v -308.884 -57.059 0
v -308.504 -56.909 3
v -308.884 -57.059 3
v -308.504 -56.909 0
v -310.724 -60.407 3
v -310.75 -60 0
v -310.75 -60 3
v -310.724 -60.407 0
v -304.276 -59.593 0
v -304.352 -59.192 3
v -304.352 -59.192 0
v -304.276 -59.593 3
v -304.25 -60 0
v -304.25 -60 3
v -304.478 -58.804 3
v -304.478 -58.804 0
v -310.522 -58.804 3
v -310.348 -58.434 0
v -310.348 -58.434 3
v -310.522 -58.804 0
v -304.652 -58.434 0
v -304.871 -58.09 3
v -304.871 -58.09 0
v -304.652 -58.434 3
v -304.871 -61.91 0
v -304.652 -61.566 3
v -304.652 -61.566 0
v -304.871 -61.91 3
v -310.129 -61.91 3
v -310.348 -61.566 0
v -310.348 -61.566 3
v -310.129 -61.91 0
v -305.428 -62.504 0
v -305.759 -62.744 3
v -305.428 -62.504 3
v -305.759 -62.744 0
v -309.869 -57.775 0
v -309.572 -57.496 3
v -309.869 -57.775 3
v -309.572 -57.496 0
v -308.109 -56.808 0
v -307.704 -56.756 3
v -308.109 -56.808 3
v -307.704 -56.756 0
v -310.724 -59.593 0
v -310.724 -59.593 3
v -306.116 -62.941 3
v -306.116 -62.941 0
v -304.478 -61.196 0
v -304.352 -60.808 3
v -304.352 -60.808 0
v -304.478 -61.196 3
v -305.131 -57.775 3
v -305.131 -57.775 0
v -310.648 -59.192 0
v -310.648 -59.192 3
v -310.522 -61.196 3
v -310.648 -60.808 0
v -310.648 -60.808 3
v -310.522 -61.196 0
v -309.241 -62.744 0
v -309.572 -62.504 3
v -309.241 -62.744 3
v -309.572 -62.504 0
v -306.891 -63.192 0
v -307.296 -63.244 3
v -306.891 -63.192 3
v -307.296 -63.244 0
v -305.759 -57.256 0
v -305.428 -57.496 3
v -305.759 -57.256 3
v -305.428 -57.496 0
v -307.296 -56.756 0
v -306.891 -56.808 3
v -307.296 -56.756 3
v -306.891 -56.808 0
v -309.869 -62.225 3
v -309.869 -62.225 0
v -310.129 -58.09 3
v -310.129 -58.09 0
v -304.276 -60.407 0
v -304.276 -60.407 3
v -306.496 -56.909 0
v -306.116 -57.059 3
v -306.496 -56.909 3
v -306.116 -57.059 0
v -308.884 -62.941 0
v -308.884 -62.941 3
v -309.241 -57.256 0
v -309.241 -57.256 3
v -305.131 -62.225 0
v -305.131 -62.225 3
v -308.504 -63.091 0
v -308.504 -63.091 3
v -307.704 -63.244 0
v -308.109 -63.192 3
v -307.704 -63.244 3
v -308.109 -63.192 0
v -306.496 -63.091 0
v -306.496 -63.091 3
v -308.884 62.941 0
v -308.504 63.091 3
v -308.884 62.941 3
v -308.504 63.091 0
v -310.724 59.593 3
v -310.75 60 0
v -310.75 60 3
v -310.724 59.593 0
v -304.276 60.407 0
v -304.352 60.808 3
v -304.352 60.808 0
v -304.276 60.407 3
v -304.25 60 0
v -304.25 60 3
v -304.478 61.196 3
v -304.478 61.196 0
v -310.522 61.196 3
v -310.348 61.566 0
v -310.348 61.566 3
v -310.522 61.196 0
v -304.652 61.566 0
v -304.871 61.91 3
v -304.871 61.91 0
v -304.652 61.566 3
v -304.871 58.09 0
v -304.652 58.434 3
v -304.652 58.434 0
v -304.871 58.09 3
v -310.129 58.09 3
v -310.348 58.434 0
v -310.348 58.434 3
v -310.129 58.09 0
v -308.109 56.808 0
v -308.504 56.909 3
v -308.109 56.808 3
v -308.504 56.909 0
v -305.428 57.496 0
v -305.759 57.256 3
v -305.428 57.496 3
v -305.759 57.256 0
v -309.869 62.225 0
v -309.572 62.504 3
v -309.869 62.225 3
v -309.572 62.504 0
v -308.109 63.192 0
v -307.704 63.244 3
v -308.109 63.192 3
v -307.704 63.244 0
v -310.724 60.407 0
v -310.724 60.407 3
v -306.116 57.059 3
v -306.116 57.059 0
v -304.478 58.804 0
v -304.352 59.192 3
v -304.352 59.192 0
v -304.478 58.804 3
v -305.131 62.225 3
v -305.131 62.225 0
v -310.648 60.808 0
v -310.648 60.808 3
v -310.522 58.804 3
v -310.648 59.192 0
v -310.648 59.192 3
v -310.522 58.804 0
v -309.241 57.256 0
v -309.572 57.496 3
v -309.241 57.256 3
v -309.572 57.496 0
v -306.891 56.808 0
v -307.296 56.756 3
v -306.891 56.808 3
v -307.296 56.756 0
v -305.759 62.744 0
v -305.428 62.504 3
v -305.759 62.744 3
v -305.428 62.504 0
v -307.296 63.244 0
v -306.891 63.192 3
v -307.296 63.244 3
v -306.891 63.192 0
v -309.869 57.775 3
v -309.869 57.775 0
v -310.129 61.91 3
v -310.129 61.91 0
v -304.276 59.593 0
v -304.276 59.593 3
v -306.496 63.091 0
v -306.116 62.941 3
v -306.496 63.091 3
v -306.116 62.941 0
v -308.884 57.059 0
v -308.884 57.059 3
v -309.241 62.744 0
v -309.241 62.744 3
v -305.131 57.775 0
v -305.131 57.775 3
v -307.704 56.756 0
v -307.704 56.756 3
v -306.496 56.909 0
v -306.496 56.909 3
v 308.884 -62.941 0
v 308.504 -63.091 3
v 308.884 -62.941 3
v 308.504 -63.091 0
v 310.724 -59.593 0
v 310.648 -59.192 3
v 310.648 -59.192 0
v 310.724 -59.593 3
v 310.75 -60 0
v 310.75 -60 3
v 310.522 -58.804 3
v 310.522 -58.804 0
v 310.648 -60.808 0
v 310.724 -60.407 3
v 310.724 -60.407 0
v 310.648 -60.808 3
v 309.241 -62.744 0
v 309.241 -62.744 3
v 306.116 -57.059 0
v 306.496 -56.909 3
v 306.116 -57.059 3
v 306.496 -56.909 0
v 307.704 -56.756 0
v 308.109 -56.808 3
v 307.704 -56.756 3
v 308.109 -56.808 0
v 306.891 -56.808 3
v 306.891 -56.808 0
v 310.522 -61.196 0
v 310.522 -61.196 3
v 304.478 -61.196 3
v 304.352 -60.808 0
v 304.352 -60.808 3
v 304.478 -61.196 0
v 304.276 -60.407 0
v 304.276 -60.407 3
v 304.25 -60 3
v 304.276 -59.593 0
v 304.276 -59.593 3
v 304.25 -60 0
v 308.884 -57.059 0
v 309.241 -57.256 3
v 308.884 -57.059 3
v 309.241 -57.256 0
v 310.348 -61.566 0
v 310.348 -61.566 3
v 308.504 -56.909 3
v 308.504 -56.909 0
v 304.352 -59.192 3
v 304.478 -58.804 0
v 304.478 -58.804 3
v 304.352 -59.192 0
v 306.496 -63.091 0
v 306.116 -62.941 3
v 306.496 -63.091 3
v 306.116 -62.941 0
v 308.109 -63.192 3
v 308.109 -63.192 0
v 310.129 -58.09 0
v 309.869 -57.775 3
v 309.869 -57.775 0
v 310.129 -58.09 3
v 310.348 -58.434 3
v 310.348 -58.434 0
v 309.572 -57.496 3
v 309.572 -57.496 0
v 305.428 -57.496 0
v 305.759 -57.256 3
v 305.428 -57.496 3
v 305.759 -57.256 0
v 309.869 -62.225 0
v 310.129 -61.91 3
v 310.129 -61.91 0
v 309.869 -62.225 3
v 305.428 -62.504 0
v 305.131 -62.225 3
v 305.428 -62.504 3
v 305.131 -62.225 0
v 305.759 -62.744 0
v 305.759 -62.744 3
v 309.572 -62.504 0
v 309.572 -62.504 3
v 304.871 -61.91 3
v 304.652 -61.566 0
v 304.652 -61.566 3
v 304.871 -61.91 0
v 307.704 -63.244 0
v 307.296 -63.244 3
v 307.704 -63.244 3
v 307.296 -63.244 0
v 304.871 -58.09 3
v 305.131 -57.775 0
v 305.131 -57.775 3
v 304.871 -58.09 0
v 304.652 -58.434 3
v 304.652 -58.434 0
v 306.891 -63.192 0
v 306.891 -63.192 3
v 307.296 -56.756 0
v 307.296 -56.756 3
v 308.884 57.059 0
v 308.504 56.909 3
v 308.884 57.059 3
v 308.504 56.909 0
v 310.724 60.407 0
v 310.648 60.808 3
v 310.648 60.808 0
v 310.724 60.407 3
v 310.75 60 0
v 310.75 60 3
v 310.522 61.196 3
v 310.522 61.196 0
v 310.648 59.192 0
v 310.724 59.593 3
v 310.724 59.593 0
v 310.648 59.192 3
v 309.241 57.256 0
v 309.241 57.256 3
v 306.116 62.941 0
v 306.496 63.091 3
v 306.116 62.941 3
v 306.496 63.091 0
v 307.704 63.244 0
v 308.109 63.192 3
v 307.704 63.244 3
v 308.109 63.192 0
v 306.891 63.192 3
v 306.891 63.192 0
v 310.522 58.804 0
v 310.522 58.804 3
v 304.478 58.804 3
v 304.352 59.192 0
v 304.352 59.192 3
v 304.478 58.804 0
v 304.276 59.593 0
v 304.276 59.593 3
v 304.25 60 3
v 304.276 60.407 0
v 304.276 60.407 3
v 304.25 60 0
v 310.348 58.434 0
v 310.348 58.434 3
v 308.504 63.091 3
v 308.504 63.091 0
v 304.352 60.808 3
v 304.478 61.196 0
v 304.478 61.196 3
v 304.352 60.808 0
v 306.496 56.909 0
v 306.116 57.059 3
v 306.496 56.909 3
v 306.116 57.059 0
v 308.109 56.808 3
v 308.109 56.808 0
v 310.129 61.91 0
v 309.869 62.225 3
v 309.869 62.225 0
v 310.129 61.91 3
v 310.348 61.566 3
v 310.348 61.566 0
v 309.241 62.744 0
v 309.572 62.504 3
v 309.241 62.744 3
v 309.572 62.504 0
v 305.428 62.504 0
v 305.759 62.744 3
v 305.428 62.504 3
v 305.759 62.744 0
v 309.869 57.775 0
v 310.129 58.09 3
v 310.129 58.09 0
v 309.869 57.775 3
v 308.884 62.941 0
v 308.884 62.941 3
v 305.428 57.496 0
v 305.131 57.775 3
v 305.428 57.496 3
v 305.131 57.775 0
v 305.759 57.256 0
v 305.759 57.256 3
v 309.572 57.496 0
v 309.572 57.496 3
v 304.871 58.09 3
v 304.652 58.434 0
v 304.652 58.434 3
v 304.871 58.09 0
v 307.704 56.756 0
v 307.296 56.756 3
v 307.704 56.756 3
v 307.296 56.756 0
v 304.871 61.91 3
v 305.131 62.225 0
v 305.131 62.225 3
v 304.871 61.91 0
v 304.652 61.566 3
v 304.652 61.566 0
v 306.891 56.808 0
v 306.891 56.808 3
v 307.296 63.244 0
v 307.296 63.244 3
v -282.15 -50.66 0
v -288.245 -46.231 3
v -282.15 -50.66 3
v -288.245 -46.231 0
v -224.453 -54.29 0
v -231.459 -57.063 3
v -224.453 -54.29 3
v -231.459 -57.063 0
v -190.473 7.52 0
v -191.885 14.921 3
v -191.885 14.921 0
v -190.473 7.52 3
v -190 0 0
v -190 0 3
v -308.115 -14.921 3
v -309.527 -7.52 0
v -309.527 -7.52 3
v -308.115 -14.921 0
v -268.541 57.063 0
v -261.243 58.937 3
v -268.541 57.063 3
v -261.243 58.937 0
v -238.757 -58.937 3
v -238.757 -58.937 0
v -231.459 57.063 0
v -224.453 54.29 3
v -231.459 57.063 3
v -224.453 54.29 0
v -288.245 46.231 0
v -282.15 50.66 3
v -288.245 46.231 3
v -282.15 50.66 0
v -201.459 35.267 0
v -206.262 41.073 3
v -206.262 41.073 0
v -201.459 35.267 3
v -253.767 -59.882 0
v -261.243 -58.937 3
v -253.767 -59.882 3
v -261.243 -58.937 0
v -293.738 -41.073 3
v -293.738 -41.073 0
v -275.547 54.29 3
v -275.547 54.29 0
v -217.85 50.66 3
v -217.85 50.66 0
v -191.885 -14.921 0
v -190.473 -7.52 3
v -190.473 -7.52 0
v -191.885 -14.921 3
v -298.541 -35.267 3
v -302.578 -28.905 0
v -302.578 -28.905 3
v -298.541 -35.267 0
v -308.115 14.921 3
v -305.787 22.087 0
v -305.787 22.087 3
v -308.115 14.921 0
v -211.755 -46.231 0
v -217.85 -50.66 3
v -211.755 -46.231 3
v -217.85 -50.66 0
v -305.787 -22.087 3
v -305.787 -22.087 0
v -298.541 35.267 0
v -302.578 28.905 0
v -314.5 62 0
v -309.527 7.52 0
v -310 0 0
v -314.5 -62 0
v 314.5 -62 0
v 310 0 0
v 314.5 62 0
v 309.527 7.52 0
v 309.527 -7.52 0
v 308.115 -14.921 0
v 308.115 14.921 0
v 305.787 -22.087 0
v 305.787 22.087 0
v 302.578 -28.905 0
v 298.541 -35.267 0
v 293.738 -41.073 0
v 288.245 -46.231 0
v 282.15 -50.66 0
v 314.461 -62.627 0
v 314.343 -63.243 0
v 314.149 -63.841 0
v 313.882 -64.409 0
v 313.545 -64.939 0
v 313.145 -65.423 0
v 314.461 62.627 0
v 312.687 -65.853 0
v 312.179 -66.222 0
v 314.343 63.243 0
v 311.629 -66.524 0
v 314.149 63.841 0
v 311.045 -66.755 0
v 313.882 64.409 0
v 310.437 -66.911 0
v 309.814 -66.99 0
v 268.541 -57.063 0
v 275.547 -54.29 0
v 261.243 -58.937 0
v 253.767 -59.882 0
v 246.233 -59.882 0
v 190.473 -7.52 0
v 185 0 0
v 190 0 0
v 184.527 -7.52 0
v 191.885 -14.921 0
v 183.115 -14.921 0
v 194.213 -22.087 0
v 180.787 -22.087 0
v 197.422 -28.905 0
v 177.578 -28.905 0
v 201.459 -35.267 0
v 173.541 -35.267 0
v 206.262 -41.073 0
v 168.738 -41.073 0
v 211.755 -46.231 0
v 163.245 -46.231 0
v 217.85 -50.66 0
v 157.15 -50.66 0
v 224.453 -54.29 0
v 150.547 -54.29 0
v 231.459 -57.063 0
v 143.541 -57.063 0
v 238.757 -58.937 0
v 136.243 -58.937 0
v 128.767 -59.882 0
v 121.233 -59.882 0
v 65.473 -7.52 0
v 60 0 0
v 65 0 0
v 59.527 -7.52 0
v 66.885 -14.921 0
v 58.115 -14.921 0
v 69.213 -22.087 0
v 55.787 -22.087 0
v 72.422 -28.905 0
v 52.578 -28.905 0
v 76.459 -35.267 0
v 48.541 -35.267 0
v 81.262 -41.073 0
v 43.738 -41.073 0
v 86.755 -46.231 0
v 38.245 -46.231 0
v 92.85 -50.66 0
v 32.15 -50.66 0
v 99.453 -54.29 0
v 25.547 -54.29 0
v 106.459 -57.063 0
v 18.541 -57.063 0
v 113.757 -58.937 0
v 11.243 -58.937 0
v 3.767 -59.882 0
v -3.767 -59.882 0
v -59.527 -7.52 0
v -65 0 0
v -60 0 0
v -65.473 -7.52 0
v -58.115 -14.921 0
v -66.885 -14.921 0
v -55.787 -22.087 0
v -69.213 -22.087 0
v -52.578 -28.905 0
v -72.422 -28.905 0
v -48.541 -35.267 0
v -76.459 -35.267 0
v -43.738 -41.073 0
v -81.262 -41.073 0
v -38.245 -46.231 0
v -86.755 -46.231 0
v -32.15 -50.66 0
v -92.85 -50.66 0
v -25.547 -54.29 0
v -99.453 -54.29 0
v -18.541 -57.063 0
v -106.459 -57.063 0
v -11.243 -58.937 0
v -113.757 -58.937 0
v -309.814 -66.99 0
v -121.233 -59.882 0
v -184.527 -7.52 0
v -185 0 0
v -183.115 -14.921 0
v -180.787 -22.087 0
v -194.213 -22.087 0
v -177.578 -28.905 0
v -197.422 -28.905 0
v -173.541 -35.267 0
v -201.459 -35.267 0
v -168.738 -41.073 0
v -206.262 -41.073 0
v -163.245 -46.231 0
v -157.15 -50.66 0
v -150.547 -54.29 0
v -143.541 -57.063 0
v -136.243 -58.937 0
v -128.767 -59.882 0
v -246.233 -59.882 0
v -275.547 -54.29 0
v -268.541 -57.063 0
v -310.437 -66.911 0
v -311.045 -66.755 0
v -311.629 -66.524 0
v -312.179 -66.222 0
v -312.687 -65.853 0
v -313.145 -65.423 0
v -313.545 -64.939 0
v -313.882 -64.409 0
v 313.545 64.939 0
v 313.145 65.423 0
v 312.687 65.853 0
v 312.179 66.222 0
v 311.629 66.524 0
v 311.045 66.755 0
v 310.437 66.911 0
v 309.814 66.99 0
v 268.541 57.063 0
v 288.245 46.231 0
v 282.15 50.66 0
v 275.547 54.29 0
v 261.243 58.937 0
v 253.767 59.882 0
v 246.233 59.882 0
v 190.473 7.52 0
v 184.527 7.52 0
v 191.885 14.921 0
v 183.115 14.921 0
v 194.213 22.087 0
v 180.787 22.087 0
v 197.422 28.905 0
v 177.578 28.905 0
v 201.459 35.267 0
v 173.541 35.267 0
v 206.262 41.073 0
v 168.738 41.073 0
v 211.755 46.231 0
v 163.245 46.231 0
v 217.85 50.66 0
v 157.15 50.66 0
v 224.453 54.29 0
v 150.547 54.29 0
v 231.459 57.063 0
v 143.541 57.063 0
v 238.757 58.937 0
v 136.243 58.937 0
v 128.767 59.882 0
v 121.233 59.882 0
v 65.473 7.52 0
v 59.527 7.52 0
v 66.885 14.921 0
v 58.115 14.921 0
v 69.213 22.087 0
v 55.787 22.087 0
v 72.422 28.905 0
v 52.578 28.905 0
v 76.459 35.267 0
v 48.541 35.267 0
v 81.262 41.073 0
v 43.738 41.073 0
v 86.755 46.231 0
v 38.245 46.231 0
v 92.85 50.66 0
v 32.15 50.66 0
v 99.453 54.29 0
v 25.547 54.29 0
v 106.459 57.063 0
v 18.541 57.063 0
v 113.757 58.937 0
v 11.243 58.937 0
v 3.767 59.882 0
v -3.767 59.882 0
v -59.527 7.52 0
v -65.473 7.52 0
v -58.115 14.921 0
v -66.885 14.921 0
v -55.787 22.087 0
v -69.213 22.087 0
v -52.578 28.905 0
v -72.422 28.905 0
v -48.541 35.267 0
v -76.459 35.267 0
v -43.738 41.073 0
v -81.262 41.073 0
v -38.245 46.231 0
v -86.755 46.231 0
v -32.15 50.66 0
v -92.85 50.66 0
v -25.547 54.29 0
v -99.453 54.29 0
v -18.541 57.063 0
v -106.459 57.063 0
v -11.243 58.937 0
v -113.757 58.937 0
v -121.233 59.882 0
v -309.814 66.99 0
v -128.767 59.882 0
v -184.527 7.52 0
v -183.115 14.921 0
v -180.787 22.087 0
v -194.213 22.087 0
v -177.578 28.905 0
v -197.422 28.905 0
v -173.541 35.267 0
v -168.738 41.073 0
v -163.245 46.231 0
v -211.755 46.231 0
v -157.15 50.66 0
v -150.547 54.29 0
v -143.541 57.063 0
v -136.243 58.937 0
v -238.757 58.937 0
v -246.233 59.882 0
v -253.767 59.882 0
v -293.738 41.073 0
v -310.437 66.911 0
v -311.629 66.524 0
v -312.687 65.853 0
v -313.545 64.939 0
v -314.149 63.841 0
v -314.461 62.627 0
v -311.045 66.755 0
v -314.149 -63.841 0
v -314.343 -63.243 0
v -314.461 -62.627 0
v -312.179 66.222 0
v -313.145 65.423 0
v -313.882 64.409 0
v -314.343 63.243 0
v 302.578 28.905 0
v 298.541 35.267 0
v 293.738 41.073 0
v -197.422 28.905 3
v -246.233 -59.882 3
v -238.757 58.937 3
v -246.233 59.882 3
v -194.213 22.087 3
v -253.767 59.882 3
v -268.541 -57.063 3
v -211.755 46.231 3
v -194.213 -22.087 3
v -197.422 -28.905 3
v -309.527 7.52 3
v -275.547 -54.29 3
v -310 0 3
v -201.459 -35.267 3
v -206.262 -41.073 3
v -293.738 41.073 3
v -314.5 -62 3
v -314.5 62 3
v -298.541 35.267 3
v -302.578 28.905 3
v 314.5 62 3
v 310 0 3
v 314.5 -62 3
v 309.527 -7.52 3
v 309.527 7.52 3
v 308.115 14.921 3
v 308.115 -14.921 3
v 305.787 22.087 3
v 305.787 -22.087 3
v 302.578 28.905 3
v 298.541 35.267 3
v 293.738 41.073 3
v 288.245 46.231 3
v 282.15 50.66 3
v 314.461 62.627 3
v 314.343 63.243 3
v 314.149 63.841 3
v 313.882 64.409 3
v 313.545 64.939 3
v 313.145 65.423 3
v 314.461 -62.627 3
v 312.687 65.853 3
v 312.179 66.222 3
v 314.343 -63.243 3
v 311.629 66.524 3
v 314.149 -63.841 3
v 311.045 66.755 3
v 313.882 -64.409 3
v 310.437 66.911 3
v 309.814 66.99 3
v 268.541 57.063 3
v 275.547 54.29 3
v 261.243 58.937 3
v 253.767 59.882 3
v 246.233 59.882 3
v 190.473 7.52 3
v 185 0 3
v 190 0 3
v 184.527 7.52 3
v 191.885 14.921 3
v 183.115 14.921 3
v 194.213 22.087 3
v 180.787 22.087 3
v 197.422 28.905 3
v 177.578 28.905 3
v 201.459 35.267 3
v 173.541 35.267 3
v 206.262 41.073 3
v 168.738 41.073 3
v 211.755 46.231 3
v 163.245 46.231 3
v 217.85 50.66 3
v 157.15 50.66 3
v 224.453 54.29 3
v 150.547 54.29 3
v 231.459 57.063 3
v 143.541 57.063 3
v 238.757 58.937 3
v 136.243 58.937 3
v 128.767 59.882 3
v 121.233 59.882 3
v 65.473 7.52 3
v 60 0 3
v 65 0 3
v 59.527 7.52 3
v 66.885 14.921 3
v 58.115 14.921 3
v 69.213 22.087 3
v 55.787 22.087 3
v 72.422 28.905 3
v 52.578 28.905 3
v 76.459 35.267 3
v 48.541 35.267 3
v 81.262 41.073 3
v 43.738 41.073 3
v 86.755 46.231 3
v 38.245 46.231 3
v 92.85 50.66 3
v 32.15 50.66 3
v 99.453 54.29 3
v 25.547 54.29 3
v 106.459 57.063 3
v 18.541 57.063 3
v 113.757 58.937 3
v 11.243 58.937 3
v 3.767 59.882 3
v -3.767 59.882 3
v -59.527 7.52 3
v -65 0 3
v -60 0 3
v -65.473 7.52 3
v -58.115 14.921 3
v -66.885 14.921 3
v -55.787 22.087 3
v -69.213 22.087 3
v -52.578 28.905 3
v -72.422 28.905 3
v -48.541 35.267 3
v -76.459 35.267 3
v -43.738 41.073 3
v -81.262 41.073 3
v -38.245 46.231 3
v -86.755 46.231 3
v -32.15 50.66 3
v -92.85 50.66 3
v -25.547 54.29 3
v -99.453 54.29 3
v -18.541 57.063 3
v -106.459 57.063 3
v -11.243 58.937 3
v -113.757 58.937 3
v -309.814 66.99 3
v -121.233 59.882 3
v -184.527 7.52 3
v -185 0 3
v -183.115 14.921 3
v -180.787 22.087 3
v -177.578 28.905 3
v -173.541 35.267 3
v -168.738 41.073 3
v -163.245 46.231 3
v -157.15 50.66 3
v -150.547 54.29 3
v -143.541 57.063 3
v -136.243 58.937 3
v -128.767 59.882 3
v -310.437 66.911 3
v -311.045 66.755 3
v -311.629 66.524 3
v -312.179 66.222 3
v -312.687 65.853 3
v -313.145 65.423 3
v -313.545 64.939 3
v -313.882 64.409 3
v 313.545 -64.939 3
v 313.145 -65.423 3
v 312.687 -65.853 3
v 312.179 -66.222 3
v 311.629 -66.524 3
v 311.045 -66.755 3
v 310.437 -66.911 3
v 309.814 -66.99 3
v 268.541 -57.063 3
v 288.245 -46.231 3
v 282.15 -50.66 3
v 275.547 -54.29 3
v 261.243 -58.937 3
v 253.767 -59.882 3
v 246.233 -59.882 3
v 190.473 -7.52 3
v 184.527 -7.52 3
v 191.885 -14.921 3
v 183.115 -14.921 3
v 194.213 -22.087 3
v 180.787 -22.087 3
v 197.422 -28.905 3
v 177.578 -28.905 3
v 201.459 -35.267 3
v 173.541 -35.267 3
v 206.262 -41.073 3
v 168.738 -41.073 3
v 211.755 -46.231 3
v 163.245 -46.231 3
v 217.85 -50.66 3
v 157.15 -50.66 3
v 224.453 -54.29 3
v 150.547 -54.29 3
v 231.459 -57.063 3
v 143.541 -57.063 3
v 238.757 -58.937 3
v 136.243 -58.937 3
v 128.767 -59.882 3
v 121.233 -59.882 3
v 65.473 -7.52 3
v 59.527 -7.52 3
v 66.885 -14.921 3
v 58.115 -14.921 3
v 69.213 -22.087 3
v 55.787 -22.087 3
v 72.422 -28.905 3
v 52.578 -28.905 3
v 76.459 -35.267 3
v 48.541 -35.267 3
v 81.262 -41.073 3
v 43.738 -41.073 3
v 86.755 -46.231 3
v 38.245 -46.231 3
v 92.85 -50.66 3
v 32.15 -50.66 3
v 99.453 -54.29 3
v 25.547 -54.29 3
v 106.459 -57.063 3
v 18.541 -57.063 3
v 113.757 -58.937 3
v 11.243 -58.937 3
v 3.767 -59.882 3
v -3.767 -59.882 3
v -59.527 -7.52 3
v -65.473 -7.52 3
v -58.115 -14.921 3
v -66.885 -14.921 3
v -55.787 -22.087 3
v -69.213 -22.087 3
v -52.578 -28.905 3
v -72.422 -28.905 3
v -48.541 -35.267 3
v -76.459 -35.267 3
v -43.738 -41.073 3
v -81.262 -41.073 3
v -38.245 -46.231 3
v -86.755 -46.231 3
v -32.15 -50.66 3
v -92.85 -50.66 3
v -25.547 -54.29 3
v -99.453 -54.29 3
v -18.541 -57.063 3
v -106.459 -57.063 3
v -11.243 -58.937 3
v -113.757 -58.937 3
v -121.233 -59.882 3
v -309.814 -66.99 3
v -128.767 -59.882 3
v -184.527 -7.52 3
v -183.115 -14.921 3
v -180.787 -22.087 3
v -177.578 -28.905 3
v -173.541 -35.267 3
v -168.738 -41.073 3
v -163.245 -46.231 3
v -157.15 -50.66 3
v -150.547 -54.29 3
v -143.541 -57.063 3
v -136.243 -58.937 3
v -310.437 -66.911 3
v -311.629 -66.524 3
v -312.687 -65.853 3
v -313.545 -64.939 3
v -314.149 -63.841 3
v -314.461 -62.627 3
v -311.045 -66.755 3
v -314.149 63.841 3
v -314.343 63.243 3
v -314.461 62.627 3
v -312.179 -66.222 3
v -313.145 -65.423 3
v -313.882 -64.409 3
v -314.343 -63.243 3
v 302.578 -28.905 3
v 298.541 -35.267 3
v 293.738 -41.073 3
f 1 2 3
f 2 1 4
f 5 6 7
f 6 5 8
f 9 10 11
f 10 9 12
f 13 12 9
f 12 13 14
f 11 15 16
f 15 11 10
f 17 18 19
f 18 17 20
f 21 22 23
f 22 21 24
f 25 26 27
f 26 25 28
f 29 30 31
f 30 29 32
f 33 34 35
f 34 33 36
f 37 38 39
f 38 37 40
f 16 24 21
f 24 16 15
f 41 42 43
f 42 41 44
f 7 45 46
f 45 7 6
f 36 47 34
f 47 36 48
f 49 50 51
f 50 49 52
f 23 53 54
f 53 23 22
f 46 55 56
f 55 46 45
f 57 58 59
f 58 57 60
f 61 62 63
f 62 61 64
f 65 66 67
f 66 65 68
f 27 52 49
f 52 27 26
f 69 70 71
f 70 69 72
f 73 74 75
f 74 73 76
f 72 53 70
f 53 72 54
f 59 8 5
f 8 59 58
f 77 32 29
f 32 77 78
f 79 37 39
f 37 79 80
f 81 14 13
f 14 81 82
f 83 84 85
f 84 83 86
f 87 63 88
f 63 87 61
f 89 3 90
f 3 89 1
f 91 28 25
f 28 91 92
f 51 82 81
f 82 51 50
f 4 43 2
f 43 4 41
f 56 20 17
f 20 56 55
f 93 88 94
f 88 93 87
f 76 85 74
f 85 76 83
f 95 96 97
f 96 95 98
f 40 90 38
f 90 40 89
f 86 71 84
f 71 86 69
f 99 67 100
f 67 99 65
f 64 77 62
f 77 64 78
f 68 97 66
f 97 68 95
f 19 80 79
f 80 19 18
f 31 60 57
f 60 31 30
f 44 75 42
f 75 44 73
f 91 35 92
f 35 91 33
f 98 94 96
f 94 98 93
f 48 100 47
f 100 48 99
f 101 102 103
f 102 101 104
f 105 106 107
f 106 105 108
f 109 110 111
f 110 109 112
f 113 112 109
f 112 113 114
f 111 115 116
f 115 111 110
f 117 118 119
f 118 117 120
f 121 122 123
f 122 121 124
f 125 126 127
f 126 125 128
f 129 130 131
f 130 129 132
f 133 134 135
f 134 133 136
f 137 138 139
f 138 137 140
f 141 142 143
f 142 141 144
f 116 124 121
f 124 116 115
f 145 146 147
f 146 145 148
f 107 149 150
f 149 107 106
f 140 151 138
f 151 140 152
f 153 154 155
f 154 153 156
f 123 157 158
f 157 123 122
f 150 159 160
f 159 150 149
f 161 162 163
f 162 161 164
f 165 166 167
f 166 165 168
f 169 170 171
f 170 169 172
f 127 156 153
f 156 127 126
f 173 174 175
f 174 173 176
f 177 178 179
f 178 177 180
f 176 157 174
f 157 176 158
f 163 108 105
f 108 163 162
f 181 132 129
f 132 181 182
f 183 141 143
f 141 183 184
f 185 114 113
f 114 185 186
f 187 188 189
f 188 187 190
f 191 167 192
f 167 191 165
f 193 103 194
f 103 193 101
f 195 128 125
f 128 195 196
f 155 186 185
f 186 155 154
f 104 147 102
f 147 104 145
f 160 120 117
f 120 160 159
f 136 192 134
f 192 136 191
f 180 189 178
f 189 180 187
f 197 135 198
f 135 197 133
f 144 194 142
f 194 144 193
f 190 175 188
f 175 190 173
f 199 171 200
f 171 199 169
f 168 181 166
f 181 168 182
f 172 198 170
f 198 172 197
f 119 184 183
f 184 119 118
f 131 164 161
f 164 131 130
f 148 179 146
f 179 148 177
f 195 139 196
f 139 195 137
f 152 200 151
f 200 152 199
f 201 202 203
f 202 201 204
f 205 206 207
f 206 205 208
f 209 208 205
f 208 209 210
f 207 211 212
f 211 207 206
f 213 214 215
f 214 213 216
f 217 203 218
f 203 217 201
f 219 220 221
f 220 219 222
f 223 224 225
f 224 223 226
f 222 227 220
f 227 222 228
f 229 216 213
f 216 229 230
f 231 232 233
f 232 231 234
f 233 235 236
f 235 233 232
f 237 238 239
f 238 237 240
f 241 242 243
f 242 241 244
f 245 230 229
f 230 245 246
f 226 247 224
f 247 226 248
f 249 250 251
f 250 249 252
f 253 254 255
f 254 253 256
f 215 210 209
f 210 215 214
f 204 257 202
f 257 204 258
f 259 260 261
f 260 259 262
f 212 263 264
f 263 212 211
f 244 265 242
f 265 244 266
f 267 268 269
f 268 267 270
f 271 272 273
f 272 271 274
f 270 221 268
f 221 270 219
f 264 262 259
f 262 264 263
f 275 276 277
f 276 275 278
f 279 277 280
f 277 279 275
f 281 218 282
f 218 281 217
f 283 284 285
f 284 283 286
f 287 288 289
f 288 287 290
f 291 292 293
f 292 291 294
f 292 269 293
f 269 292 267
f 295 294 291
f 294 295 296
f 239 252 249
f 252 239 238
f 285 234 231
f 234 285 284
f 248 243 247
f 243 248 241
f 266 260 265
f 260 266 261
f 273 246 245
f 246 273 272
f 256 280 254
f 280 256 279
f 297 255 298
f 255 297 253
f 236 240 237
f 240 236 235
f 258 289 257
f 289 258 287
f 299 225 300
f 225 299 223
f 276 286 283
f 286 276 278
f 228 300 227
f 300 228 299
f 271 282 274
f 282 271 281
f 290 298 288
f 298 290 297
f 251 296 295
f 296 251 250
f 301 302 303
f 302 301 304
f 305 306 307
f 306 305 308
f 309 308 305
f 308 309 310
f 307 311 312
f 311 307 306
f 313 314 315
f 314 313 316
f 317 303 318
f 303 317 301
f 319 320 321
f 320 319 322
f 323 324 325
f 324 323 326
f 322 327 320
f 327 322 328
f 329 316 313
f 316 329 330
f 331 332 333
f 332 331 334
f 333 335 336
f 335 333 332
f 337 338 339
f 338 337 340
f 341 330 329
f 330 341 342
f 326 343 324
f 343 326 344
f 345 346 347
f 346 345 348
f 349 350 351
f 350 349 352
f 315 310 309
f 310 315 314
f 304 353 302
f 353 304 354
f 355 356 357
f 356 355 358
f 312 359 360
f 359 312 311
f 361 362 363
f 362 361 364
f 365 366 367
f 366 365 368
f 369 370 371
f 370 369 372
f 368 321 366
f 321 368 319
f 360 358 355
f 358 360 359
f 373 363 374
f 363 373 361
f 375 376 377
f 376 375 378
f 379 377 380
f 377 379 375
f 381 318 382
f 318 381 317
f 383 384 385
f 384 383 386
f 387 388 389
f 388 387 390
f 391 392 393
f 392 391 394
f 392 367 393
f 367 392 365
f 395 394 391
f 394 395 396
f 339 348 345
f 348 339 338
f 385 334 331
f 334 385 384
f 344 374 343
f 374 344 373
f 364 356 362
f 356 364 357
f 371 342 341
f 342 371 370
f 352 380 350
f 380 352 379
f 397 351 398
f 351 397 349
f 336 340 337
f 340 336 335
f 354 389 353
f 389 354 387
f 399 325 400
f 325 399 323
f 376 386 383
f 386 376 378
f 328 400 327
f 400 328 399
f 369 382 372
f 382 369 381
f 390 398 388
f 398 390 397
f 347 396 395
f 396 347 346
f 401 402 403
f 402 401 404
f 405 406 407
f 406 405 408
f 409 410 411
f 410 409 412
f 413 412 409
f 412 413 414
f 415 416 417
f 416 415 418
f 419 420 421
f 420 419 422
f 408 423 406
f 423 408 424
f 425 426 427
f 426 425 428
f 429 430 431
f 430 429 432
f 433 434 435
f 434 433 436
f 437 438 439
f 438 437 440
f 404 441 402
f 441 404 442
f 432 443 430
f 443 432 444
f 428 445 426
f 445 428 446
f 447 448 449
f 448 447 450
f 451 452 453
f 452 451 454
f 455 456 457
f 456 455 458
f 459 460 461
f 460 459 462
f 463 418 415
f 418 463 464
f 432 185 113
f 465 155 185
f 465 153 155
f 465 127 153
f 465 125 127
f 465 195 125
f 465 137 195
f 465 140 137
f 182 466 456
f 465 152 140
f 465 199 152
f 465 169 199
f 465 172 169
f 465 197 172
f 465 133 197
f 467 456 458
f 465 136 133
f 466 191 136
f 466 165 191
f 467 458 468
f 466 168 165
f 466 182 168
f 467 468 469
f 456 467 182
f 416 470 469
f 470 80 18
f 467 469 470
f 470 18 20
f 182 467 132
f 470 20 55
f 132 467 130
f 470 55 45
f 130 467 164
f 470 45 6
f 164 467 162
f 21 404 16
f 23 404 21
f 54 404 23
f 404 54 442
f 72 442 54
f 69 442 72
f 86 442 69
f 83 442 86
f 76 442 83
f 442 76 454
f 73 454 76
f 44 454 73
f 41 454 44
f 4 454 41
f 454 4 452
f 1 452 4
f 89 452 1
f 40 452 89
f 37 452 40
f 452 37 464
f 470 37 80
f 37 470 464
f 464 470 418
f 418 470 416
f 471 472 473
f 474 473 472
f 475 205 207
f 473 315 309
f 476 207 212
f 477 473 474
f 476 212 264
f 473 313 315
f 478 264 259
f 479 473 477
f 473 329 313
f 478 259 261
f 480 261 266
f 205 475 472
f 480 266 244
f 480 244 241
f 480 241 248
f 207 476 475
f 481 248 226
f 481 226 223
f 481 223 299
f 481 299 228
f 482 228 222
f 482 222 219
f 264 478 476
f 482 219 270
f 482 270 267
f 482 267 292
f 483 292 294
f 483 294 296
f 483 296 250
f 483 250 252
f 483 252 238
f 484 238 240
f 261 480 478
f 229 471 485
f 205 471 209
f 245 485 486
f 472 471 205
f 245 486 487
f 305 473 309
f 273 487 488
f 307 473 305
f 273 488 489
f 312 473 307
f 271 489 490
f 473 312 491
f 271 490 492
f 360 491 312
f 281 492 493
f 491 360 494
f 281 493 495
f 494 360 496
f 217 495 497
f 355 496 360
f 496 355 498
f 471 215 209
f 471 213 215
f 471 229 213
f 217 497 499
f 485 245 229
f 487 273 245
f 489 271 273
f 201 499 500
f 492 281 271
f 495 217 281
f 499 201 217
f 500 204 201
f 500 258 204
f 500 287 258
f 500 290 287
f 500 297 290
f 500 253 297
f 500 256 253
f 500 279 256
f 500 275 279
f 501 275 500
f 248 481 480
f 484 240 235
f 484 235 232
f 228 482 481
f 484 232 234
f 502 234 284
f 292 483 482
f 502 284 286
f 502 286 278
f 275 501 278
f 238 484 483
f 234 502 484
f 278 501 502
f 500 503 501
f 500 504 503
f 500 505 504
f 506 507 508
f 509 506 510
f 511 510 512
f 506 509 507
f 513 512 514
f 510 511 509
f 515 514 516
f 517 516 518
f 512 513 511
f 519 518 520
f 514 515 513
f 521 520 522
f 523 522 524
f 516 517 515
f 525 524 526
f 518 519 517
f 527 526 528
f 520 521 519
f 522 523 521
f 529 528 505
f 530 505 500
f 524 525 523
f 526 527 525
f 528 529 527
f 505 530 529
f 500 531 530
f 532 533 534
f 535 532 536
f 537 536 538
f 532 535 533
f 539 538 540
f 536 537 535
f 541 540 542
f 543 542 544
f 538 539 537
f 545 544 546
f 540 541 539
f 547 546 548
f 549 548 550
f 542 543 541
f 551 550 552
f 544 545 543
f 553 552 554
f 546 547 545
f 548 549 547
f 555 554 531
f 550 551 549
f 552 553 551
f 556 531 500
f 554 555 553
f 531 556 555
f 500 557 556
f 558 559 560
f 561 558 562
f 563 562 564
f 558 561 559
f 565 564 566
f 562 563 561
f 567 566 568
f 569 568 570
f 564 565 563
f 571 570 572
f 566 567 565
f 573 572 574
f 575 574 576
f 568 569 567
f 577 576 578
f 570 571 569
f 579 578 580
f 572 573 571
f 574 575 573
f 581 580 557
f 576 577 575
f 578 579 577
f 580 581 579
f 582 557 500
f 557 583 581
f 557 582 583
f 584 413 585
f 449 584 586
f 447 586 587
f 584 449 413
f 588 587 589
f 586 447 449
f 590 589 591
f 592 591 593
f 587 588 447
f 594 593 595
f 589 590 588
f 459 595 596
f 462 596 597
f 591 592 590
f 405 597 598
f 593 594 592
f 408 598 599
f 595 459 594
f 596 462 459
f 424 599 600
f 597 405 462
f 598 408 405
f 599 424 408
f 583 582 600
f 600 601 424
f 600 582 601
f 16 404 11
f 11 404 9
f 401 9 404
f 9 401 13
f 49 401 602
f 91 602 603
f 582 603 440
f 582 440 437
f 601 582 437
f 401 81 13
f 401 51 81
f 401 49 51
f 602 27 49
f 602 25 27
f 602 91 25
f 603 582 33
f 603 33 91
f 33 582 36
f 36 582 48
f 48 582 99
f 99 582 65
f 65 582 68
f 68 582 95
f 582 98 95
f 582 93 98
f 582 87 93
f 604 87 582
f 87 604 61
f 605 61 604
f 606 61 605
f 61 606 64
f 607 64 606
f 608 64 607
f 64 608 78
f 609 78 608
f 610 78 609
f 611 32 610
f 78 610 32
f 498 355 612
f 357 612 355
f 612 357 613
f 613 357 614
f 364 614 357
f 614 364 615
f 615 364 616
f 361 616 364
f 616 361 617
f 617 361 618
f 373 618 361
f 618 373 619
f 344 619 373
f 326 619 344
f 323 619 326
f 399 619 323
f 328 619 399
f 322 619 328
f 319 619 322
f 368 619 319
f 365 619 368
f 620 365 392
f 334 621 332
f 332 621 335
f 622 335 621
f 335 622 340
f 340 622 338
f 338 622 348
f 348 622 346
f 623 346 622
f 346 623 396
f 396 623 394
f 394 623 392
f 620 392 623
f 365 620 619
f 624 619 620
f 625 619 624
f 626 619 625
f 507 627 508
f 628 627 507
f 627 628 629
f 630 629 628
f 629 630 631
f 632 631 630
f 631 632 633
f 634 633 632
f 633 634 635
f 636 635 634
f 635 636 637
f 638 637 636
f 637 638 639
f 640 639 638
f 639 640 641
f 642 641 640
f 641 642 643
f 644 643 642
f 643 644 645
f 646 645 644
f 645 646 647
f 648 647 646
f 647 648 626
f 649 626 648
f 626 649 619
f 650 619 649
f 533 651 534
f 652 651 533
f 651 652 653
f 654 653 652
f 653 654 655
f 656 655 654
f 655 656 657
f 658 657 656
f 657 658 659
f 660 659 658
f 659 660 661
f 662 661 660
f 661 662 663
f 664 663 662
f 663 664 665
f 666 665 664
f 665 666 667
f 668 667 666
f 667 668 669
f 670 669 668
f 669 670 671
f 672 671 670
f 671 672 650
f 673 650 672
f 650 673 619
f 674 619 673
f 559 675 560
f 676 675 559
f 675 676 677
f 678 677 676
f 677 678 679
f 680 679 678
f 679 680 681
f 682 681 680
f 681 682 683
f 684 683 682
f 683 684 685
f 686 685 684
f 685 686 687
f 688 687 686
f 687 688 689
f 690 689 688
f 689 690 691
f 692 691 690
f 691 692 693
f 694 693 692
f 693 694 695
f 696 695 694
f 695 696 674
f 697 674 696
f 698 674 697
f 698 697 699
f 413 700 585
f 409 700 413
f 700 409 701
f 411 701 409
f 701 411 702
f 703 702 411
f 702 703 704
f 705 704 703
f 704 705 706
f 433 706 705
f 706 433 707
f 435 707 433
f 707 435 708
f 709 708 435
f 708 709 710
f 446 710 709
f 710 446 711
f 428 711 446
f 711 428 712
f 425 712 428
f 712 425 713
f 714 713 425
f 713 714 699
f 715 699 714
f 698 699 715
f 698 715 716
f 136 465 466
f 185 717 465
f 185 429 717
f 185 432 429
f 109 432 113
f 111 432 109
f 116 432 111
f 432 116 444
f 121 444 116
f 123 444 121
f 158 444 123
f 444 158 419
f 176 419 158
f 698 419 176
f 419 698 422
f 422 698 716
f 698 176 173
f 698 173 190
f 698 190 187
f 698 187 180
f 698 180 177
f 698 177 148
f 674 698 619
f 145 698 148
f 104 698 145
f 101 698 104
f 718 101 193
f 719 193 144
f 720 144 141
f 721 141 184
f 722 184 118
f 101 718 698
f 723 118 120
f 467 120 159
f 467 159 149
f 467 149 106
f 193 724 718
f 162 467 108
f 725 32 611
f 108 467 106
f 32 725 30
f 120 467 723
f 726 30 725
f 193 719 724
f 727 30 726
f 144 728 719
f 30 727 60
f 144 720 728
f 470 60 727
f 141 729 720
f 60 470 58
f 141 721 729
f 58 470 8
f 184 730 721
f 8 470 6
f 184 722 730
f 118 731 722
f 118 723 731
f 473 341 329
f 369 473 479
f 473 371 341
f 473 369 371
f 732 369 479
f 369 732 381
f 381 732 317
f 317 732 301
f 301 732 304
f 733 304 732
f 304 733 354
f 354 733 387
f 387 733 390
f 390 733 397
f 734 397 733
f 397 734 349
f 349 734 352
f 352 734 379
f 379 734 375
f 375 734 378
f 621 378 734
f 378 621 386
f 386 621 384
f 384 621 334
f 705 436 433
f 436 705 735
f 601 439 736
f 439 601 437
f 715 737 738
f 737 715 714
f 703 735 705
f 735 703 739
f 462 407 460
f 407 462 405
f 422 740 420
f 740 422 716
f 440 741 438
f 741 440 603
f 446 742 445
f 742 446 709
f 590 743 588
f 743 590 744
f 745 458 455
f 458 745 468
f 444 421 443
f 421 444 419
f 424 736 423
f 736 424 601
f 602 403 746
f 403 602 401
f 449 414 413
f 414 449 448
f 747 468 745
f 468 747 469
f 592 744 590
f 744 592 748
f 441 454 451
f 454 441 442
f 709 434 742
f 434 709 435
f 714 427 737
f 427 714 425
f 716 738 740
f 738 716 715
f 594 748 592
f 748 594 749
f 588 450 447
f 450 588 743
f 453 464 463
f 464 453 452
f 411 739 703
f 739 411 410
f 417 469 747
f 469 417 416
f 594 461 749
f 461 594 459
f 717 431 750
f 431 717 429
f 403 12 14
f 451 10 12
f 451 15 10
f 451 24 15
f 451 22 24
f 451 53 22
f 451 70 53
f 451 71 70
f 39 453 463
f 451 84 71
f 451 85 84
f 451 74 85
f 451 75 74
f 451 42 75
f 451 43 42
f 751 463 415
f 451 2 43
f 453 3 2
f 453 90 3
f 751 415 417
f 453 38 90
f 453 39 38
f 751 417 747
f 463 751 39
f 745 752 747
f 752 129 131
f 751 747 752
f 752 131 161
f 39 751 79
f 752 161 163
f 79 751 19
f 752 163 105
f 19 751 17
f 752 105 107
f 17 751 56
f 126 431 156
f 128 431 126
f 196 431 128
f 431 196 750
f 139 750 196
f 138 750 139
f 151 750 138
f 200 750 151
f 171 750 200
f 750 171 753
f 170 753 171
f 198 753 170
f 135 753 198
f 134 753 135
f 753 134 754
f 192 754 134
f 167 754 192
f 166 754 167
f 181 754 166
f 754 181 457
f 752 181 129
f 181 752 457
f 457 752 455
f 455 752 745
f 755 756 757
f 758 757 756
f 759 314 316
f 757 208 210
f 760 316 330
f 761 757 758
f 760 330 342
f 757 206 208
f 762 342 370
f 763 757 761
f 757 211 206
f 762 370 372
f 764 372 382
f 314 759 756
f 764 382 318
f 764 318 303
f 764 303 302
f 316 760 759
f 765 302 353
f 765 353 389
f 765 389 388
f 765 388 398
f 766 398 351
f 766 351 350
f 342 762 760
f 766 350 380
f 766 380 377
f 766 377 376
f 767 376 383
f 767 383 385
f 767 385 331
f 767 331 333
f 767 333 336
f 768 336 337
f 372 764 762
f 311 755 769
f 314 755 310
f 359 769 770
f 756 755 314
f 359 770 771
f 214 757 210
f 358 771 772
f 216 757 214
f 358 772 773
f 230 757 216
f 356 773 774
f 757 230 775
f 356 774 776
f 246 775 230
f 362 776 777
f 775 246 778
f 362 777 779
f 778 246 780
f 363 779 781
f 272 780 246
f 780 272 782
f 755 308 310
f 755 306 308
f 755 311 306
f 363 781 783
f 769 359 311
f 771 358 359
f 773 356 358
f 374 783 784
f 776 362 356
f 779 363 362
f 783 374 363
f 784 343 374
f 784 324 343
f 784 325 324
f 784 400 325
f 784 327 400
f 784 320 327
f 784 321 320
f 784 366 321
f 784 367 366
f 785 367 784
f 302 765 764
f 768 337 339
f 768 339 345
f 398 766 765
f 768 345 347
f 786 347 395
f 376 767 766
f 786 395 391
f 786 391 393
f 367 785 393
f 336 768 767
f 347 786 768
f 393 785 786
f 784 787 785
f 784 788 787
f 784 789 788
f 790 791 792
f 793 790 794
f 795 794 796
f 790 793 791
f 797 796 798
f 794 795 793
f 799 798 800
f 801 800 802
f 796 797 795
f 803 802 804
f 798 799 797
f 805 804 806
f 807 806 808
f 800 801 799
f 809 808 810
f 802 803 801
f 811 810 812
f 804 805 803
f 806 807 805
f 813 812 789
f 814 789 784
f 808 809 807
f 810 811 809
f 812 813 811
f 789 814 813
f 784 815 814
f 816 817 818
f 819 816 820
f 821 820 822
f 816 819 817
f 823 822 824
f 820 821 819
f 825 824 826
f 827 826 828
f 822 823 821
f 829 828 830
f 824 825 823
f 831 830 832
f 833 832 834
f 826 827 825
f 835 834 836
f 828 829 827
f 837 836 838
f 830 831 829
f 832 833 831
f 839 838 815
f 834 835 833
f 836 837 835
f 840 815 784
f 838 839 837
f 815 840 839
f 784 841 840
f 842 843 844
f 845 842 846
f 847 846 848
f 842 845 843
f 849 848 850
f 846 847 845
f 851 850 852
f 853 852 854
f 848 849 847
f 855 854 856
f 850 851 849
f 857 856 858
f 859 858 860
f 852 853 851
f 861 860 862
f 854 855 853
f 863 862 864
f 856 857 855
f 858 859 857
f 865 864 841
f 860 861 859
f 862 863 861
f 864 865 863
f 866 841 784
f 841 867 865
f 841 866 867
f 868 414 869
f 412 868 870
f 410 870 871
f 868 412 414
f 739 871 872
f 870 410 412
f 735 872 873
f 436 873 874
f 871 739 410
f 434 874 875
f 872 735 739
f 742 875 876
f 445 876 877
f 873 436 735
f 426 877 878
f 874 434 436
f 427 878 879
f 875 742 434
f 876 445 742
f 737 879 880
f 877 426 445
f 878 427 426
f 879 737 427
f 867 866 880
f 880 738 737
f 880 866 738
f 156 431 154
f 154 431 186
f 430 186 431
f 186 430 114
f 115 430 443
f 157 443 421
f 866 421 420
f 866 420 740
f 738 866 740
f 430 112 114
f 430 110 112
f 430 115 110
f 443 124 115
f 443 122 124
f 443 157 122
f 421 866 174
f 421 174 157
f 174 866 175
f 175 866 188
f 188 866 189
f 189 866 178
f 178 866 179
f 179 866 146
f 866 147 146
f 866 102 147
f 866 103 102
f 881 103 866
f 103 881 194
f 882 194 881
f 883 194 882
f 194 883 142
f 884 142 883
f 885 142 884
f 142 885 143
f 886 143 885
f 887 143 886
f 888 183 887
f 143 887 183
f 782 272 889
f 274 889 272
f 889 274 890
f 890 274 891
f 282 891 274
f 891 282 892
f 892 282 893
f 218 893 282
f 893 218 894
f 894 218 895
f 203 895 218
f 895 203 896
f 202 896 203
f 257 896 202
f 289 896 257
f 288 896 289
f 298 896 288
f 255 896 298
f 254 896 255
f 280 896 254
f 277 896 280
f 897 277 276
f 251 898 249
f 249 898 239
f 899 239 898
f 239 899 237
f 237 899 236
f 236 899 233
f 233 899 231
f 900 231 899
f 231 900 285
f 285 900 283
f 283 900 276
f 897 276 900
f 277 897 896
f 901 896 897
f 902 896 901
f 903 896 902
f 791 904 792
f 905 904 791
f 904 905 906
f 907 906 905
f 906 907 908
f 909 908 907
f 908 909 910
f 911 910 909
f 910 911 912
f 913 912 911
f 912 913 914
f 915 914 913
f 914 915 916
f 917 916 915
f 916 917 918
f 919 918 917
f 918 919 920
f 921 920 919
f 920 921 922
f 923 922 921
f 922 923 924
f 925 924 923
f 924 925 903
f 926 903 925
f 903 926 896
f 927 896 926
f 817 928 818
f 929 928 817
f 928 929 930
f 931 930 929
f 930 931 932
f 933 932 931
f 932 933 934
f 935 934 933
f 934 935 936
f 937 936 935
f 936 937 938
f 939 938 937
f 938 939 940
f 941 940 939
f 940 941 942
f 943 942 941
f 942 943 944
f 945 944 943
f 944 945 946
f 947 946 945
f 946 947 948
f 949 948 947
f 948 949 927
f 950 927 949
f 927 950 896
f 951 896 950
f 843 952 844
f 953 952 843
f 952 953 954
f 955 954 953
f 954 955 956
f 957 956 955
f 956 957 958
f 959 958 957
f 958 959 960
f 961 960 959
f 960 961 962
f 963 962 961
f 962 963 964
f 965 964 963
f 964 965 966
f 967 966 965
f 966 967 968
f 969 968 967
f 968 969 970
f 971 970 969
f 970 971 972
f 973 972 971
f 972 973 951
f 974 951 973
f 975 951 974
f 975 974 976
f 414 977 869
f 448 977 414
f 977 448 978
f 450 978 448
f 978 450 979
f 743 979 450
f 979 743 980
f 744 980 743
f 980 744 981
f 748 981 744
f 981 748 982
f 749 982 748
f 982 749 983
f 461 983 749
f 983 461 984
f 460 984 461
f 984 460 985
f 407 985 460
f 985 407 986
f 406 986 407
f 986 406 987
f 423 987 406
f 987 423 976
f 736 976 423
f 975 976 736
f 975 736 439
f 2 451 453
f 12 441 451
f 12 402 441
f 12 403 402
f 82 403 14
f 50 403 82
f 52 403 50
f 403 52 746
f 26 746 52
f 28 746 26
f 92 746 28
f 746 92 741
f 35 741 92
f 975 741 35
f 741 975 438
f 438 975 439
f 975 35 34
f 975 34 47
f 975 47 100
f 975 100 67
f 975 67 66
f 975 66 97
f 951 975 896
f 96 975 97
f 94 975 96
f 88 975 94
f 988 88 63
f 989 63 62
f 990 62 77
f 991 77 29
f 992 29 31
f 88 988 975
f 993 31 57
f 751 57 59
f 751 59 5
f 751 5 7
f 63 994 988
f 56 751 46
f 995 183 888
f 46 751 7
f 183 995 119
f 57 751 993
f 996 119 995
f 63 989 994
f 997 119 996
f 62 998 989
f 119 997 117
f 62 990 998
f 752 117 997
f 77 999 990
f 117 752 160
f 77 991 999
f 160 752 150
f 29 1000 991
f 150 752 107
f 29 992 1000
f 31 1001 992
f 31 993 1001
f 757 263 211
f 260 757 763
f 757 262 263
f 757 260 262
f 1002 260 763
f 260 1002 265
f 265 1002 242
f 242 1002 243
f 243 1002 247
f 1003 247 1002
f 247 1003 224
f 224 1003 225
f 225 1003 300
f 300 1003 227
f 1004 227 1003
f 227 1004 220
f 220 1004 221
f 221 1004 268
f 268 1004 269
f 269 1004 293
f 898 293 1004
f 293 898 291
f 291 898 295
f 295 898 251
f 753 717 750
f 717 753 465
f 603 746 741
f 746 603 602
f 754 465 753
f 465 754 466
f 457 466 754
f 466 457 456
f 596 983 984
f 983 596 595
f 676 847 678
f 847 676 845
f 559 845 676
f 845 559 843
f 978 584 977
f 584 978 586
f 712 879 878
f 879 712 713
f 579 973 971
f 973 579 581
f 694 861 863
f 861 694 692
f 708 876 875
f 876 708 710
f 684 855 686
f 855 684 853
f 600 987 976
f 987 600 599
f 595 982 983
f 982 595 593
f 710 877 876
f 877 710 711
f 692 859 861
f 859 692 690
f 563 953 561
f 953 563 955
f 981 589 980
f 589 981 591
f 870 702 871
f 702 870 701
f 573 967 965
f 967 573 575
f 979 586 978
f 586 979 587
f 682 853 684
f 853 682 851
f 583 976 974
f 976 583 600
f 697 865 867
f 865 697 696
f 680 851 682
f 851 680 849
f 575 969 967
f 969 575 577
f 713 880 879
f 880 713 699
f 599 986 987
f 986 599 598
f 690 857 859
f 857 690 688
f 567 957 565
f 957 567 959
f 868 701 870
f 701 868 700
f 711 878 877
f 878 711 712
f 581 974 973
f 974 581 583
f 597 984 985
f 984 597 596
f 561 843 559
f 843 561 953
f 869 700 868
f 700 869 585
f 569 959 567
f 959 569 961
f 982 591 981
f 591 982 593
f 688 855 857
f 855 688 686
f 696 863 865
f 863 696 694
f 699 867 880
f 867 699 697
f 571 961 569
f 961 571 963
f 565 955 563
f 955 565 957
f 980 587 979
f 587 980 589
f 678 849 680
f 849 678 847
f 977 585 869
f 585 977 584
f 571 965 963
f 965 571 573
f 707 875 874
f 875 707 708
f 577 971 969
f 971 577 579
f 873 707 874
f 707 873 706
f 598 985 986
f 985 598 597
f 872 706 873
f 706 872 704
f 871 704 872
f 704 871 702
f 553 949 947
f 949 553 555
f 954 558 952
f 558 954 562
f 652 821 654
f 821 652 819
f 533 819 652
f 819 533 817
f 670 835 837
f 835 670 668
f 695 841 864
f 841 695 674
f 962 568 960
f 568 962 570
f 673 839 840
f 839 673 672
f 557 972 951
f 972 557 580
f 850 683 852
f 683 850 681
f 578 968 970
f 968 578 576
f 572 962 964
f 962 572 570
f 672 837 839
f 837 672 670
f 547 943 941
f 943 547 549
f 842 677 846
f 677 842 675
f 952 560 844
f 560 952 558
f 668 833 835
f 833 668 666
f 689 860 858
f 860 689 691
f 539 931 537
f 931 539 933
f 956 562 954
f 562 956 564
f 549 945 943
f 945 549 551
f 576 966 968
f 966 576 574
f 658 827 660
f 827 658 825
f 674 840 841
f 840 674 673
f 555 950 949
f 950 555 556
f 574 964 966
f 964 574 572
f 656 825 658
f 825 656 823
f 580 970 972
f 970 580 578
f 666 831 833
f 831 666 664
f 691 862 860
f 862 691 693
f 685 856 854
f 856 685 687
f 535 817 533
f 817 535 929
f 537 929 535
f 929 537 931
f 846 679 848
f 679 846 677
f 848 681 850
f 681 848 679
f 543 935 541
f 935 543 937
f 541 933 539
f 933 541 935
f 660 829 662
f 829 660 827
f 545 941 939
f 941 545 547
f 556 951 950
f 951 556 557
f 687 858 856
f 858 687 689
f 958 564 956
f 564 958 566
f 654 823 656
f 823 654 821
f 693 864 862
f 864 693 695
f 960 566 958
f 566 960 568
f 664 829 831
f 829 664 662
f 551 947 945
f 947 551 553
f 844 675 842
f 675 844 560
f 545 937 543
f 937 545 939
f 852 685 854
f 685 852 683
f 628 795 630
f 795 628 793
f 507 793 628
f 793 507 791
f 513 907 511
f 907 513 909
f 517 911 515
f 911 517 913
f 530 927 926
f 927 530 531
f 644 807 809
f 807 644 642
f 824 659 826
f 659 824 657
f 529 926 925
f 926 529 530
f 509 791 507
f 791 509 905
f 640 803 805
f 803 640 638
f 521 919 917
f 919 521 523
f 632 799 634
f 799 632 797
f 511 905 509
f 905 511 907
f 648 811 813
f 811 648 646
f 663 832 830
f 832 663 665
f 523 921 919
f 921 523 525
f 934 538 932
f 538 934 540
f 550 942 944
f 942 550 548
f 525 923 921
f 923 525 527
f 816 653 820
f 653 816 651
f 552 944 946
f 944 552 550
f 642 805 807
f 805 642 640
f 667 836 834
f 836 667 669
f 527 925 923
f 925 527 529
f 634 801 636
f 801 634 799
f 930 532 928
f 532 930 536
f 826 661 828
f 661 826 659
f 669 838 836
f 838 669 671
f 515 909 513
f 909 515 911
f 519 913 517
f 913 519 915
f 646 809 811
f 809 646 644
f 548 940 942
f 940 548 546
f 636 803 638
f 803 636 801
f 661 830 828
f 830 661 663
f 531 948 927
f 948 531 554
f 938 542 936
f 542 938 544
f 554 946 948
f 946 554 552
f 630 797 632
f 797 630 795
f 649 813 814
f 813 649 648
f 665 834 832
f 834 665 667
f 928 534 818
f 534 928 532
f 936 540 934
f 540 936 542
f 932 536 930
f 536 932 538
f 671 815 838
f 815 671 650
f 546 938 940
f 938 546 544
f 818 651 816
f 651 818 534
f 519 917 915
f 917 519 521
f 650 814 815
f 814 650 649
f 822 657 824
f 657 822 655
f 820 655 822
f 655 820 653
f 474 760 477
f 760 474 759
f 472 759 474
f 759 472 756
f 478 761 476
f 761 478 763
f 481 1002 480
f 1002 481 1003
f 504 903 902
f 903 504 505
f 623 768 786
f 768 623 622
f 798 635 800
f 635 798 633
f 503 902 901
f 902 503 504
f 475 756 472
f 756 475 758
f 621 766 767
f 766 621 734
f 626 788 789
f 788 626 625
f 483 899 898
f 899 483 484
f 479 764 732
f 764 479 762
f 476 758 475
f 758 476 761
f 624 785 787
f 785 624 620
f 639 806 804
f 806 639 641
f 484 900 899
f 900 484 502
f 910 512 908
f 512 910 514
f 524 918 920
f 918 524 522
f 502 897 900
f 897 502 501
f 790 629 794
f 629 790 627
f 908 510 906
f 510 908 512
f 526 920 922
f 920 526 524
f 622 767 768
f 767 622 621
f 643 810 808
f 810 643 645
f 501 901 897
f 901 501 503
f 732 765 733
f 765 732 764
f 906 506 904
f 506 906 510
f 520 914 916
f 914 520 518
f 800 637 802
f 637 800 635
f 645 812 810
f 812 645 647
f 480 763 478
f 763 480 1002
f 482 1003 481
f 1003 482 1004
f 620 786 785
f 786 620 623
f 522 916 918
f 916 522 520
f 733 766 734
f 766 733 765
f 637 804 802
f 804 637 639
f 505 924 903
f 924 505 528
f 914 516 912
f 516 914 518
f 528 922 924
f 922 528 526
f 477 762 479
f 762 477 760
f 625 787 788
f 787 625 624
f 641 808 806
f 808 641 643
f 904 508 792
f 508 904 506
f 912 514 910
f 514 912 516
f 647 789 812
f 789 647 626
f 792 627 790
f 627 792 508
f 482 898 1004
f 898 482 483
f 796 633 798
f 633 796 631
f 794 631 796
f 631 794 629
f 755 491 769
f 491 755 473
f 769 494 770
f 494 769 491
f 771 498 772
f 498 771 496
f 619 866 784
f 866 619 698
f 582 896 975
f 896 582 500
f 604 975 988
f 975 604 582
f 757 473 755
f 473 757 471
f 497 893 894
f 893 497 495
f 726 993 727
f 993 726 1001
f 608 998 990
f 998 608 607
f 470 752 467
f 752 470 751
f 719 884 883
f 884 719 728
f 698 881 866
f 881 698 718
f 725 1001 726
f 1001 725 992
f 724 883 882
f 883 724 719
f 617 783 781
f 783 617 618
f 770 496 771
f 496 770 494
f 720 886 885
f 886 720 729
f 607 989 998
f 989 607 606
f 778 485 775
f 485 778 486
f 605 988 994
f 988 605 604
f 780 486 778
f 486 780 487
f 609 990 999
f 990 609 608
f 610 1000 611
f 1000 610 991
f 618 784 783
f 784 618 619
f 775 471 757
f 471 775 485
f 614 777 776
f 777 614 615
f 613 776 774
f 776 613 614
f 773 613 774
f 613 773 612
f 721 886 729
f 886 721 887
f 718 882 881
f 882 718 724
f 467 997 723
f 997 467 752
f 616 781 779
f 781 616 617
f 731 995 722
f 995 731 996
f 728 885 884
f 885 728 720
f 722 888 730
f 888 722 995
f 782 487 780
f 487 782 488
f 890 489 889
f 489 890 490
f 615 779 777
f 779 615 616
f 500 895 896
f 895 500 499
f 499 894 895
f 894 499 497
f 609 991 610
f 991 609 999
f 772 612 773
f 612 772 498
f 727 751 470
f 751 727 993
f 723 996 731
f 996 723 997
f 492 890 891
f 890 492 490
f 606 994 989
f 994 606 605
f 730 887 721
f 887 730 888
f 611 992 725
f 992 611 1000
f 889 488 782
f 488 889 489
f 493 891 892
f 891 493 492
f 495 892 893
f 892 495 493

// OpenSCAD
$fn = 50;


difference() {
	union() {
		hull() {
			translate(v = [-309.5000000000, 62.0000000000, 0]) {
				cylinder(h = 3, r = 5);
			}
			translate(v = [309.5000000000, 62.0000000000, 0]) {
				cylinder(h = 3, r = 5);
			}
			translate(v = [-309.5000000000, -62.0000000000, 0]) {
				cylinder(h = 3, r = 5);
			}
			translate(v = [309.5000000000, -62.0000000000, 0]) {
				cylinder(h = 3, r = 5);
			}
		}
	}
	union() {
		#translate(v = [-307.5000000000, -60.0000000000, -100.0000000000]) {
			cylinder(h = 200, r = 3.2500000000);
		}
		#translate(v = [-307.5000000000, 60.0000000000, -100.0000000000]) {
			cylinder(h = 200, r = 3.2500000000);
		}
		#translate(v = [307.5000000000, -60.0000000000, -100.0000000000]) {
			cylinder(h = 200, r = 3.2500000000);
		}
		#translate(v = [307.5000000000, 60.0000000000, -100.0000000000]) {
			cylinder(h = 200, r = 3.2500000000);
		}
		#translate(v = [-250.0000000000, 0, 0]) {
			cylinder(h = 3, r = 60.0000000000);
		}
		#translate(v = [-125.0000000000, 0, 0]) {
			cylinder(h = 3, r = 60.0000000000);
		}
		#cylinder(h = 3, r = 60.0000000000);
		#translate(v = [125.0000000000, 0, 0]) {
			cylinder(h = 3, r = 60.0000000000);
		}
		#translate(v = [250.0000000000, 0, 0]) {
			cylinder(h = 3, r = 60.0000000000);
		}
	}
}
